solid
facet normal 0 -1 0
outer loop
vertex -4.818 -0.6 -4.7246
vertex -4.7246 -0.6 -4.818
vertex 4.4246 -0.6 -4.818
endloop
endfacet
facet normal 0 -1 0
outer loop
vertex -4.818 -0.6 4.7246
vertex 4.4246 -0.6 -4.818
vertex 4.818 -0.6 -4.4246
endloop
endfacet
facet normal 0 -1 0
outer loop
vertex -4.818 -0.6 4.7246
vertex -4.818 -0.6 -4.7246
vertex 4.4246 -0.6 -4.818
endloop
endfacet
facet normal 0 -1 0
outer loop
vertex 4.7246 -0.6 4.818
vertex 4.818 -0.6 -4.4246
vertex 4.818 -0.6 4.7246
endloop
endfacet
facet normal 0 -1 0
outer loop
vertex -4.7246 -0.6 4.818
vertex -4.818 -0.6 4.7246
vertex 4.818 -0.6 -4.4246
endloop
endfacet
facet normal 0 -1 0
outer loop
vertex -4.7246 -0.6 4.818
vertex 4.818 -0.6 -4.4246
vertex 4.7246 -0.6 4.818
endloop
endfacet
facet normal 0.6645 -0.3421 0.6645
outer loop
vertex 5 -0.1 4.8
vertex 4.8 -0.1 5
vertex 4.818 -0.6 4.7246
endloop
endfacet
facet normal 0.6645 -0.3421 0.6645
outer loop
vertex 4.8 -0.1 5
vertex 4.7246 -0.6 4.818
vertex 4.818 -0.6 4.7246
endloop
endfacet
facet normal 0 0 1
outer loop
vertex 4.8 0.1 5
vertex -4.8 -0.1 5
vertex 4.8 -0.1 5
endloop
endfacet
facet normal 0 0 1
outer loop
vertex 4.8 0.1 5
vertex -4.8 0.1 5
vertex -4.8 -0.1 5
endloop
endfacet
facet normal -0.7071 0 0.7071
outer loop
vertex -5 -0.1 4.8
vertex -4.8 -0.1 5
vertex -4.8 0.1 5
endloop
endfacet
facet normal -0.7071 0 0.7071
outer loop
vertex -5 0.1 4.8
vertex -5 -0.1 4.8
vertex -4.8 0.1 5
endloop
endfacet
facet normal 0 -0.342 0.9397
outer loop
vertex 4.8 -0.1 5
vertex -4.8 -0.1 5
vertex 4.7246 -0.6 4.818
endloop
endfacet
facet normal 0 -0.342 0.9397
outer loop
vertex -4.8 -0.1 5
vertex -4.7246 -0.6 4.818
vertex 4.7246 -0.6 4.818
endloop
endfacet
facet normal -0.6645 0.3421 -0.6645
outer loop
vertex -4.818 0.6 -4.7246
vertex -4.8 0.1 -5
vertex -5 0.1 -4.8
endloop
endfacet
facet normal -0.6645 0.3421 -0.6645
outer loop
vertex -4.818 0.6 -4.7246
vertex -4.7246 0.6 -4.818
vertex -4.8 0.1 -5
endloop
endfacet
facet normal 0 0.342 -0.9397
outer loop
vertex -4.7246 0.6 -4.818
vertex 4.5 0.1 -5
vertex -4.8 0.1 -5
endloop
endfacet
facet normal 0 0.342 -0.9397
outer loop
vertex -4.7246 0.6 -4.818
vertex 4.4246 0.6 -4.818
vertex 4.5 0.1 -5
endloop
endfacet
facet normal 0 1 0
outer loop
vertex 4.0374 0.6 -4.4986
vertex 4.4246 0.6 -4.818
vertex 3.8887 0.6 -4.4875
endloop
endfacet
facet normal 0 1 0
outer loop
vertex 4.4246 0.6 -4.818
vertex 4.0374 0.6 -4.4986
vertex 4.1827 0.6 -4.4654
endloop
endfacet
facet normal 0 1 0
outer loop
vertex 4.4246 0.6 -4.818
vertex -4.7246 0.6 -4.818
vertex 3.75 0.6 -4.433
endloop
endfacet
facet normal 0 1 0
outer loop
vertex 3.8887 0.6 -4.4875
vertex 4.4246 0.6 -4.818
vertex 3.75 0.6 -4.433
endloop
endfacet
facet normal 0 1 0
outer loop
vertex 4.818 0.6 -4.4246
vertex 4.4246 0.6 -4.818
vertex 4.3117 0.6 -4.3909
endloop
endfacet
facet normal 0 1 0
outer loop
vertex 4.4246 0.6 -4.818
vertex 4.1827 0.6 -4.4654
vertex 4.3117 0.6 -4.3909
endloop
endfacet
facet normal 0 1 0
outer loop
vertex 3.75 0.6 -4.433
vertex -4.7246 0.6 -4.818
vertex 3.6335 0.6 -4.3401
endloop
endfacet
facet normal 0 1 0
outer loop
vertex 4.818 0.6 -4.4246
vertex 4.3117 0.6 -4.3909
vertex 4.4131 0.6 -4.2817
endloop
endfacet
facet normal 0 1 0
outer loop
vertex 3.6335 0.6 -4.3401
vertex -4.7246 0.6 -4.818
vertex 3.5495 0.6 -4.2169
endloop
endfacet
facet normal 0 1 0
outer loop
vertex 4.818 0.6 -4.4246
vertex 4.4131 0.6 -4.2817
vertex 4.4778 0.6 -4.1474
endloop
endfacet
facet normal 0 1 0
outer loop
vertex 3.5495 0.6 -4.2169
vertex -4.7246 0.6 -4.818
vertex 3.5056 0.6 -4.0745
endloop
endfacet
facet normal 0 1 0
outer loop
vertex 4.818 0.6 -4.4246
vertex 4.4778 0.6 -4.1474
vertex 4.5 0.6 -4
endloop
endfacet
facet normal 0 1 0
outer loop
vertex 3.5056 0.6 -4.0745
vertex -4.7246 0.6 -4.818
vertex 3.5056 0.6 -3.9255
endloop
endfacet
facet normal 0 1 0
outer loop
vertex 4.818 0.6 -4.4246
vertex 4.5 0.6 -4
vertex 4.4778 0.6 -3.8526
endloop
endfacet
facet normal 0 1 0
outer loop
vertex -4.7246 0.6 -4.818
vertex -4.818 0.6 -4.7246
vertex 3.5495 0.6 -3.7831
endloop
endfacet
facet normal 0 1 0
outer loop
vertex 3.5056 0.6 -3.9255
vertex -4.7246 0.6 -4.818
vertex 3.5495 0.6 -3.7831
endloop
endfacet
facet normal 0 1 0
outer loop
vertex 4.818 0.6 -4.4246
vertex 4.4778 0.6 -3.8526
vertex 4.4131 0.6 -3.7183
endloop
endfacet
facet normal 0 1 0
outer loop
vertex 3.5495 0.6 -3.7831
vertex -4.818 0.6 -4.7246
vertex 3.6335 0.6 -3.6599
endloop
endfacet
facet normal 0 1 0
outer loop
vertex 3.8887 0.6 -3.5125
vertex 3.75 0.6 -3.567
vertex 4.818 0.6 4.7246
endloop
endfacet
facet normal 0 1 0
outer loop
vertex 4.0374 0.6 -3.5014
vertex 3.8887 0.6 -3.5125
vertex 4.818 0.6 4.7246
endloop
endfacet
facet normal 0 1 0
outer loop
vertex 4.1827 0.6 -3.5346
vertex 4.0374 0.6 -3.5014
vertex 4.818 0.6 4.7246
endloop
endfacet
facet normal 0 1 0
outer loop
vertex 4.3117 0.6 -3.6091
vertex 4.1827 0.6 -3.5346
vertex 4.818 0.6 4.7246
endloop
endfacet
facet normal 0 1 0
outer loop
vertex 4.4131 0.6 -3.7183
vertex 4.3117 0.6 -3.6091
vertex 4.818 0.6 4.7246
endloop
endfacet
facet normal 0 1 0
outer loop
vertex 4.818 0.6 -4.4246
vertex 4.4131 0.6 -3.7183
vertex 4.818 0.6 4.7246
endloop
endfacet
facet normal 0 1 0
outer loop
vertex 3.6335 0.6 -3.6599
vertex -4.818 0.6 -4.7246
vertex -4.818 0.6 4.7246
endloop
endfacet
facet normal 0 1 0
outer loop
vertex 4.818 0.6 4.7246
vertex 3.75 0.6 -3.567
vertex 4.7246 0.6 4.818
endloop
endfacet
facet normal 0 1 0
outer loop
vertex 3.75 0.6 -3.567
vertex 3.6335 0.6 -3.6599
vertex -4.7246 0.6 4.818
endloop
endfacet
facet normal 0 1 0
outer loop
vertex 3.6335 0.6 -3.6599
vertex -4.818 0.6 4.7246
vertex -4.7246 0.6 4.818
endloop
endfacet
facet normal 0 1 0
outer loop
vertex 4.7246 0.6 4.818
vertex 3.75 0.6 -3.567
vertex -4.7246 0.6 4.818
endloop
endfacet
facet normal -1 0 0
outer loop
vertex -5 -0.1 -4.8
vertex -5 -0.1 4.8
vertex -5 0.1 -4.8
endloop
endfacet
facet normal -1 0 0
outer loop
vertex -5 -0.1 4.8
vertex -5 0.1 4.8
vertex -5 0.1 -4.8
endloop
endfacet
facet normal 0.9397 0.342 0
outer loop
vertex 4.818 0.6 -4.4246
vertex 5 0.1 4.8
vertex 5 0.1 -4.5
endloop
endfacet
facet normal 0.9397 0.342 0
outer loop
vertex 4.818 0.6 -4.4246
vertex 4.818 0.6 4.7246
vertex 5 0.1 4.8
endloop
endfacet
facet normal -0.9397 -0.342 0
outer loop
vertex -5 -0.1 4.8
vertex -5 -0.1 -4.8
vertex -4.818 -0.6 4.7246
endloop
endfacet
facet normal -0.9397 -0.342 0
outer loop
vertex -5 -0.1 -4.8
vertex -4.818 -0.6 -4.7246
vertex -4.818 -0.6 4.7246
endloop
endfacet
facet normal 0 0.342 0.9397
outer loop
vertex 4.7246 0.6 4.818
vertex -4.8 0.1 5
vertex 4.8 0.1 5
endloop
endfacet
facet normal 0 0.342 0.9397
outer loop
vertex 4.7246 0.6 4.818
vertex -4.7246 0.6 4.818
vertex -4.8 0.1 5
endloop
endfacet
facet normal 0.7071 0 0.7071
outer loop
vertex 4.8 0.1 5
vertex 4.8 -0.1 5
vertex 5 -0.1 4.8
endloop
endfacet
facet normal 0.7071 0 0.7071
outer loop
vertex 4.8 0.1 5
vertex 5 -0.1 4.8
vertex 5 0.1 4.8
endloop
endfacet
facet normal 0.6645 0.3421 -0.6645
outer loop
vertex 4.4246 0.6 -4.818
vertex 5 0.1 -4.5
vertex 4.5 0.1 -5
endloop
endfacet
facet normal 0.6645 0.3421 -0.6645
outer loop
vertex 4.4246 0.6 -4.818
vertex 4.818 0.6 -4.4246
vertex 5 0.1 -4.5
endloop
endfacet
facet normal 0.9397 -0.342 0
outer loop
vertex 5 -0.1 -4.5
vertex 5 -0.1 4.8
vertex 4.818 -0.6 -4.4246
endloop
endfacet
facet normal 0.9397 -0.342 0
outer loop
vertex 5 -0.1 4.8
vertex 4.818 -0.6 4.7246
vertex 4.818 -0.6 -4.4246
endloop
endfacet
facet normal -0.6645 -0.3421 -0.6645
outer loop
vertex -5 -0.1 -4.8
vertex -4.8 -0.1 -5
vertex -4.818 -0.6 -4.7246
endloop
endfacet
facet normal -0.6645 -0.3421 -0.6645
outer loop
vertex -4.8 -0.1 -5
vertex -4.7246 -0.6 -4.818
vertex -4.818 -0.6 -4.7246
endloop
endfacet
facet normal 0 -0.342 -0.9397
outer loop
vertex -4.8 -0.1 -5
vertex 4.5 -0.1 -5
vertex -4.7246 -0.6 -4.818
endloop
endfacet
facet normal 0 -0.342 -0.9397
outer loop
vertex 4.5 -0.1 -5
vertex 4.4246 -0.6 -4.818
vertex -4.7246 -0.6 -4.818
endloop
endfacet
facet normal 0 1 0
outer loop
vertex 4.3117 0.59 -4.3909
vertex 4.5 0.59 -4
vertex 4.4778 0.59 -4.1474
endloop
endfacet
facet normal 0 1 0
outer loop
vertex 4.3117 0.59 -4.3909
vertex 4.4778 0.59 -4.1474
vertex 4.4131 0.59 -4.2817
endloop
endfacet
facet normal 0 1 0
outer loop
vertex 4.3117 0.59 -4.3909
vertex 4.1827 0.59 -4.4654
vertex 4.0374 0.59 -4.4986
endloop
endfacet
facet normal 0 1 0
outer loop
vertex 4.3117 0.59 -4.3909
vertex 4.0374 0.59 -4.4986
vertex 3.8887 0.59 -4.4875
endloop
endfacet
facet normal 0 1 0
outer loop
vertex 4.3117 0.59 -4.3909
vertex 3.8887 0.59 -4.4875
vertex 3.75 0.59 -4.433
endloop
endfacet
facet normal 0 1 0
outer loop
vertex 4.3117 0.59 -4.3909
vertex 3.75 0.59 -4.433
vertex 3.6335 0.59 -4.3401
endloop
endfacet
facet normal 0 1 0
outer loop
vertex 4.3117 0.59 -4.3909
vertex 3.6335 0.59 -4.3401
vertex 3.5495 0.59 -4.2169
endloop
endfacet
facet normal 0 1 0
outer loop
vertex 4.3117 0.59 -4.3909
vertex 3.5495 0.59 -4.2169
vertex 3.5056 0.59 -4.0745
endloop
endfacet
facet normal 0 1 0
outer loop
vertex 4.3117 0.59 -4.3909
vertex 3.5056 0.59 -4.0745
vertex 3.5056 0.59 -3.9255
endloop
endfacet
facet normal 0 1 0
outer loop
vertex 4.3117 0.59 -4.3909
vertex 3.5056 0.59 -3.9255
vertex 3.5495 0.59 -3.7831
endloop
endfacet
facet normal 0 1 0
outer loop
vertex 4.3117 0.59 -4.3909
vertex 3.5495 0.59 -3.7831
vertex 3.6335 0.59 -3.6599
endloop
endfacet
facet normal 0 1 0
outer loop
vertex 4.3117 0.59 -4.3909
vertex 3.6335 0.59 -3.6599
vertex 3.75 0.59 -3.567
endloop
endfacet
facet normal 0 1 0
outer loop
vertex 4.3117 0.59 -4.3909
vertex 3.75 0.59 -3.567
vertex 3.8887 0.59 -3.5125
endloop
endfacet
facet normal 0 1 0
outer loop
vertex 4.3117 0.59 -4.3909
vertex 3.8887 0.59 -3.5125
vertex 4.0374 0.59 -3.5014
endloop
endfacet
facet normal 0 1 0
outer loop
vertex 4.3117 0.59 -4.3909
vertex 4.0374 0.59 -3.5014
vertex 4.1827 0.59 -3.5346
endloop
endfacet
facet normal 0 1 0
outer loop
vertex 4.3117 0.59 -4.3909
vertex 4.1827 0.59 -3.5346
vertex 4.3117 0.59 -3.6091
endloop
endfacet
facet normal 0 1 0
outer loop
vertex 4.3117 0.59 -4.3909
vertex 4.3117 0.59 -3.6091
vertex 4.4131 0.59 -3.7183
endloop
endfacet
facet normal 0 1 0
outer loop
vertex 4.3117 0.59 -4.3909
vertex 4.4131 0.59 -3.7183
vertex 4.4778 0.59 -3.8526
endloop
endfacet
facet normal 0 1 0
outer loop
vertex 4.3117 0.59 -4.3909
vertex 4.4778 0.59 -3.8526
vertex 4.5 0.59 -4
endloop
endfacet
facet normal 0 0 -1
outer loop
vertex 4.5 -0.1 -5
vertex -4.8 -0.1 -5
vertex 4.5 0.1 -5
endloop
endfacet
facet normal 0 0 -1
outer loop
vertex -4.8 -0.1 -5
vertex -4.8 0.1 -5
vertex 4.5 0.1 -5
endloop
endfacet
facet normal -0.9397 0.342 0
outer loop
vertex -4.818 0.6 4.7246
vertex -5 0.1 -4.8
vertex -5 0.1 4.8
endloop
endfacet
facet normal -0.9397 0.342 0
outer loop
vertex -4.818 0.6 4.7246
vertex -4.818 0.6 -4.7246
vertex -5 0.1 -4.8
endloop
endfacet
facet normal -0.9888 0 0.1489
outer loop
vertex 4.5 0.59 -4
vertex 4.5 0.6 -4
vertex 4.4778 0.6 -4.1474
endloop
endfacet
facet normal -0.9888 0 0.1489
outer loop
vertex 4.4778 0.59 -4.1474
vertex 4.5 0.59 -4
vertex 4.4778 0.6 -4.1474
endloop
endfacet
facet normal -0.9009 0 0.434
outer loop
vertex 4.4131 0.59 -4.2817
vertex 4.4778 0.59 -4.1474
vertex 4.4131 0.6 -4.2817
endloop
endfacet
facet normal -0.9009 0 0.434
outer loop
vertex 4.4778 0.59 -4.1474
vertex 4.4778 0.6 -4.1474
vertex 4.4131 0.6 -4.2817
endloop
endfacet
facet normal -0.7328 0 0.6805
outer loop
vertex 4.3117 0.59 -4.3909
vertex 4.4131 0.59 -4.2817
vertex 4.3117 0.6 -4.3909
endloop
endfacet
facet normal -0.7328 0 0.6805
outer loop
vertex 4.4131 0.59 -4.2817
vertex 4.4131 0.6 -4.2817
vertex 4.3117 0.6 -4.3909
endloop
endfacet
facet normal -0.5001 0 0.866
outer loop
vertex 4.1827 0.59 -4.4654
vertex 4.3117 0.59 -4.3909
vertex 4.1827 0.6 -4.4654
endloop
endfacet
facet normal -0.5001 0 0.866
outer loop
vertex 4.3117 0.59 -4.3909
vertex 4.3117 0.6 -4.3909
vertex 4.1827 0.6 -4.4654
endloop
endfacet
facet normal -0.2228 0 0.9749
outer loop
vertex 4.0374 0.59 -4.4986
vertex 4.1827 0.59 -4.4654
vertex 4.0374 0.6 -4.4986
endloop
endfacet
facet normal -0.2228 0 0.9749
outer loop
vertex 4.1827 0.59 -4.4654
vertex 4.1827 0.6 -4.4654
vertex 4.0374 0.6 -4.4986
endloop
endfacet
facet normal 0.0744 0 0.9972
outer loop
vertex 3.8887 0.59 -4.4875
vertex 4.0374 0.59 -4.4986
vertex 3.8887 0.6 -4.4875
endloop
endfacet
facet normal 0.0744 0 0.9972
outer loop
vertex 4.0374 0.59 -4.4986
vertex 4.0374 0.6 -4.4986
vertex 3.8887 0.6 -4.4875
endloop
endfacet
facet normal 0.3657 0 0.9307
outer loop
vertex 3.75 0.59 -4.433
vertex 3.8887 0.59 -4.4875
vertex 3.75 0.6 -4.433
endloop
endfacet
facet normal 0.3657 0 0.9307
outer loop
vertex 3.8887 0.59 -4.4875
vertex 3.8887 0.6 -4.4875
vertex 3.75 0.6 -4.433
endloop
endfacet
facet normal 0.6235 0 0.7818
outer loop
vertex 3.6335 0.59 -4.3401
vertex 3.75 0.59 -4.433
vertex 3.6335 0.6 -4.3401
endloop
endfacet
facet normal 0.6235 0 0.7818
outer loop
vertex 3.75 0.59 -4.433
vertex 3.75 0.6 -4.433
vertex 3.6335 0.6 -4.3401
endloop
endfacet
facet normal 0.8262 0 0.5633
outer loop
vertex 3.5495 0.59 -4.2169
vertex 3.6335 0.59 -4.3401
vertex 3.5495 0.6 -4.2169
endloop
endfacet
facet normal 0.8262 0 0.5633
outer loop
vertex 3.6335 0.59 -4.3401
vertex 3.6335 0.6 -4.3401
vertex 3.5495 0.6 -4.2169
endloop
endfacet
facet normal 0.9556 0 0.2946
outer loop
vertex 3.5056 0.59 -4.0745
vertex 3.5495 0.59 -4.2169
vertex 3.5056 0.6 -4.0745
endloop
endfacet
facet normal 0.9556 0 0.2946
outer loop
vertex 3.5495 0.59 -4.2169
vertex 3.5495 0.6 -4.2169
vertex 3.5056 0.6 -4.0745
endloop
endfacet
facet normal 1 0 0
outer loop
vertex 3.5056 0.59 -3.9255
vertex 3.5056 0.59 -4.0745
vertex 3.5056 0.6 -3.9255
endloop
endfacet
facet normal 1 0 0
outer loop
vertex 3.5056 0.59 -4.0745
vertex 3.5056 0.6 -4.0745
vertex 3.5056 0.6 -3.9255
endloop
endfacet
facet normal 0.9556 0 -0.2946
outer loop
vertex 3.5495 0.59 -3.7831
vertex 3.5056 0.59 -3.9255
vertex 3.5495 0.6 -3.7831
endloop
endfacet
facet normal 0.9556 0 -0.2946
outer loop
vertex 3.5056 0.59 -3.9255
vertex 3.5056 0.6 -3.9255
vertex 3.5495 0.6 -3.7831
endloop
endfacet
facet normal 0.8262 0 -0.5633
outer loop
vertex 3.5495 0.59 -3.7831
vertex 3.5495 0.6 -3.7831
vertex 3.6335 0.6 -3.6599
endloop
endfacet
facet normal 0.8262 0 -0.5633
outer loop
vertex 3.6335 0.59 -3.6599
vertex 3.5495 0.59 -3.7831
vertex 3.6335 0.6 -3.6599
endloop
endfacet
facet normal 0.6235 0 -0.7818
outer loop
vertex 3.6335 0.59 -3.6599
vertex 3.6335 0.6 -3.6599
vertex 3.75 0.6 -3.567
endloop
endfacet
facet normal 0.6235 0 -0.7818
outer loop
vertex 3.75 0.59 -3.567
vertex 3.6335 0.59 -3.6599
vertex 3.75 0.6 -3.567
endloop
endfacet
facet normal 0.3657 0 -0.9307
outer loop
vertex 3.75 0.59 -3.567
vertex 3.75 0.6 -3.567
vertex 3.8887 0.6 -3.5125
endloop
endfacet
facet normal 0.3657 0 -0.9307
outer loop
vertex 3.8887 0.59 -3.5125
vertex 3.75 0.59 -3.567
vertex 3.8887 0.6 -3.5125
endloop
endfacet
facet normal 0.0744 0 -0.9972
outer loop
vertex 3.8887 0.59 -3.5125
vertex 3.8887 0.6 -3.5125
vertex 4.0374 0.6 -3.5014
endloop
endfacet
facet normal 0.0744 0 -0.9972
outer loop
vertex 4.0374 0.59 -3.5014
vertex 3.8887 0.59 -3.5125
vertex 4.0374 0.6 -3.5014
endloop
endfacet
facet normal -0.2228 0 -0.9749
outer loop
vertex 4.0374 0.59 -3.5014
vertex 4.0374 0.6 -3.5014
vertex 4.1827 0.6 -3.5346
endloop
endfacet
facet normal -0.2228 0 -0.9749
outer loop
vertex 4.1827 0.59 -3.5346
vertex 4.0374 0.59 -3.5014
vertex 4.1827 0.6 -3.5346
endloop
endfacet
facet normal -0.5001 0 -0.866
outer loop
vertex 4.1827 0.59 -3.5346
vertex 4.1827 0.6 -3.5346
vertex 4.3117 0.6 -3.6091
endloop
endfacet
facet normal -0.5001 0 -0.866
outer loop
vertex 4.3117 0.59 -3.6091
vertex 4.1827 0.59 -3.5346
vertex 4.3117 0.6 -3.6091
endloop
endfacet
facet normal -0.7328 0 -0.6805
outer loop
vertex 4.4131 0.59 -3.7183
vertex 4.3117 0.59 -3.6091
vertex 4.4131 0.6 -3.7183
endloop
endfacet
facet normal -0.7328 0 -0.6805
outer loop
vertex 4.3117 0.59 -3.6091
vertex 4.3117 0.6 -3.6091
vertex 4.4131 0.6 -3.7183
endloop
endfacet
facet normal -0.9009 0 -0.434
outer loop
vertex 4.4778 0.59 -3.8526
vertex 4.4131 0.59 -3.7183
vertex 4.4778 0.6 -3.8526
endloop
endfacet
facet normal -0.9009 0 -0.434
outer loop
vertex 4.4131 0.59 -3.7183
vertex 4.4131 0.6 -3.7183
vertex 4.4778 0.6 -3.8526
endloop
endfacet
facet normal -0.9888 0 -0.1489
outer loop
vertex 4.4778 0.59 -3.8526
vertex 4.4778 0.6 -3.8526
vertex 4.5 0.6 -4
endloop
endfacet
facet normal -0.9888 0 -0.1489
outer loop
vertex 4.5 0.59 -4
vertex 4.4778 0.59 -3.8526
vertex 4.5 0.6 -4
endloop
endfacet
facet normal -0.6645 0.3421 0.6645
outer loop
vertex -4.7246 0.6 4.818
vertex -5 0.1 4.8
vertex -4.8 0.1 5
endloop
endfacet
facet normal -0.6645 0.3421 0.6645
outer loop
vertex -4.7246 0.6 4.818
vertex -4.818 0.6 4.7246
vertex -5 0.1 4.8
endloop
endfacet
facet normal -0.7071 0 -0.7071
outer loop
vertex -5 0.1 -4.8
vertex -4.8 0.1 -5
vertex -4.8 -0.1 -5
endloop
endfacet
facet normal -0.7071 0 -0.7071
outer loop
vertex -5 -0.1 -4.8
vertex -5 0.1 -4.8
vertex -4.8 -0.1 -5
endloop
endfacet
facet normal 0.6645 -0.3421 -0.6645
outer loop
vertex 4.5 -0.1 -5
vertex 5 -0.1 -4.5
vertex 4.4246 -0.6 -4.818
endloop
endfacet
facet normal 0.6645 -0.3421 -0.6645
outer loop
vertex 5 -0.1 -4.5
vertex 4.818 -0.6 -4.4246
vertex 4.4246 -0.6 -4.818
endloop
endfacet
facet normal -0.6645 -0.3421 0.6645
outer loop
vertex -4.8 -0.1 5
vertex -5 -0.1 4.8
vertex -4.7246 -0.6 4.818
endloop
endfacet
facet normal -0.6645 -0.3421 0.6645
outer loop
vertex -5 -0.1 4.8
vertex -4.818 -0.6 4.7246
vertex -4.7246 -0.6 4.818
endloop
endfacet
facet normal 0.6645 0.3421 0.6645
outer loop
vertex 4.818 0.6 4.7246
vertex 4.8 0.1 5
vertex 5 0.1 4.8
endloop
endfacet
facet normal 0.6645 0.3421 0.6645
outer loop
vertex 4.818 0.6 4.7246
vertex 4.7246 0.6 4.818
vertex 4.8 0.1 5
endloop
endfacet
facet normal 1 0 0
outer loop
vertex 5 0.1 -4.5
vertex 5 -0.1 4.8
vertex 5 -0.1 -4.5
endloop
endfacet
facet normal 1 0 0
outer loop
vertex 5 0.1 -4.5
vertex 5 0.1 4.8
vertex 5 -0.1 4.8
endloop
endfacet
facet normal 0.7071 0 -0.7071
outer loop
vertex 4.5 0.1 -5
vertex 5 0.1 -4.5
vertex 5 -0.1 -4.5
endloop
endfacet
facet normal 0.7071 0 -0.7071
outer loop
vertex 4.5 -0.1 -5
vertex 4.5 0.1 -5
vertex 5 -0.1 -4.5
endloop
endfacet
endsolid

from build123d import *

# Parameters (mm, degrees)
SKETCH1_W           = 10
SKETCH1_H           = 10
BOSS_EXTRUDE1_DEPTH = 0.1
CHAMFER1_SIZE       = 0.2
CHAMFER2_SIZE       = 0.5
BOSS_EXTRUDE2_DEPTH = 0.5
BOSS_EXTRUDE2_TAPER = 20
SKETCH3_R           = 0.5
CUT_EXTRUDE1_DEPTH  = 0.01


with BuildPart() as part:
    # Sketch1 → Boss-Extrude1 (new body, symmetric)
    with BuildSketch(Plane(origin=(0, 0, 0), x_dir=(1, 0, 0), z_dir=(0, 1, 0))):
        Rectangle(SKETCH1_W, SKETCH1_H)
    extrude(amount=BOSS_EXTRUDE1_DEPTH, both=True)

    # Chamfer1
    chamfer1_edges = [part.edges().sort_by_distance(p)[0] for p in [
        (5, 0, 5),
        (-5, 0, 5),
        (-5, 0, -5),
    ]]
    chamfer(chamfer1_edges, length=CHAMFER1_SIZE)

    # Chamfer2
    chamfer2_edges = [part.edges().sort_by_distance(p)[0] for p in [
        (5, 0, -5),
    ]]
    chamfer(chamfer2_edges, length=CHAMFER2_SIZE)

    # Sketch2 → Boss-Extrude2 (add)
    with BuildSketch(Plane(origin=(0, 0.1, 0), x_dir=(1, 0, 0), z_dir=(0, 1, 0))):
        Polygon((-4.8, 5), (-5, 4.8), (-5, -4.8), (-4.8, -5), (4.8, -5), (5, -4.8), (5, 4.5), (4.5, 5), align=None)
    boss_extrude2 = extrude(amount=BOSS_EXTRUDE2_DEPTH, taper=BOSS_EXTRUDE2_TAPER)

    # Mirror1: Boss-Extrude2 across plane
    add(boss_extrude2.mirror(Plane.ZX))

    # Sketch3 → Cut-Extrude1 (cut)
    with BuildSketch(Plane(origin=(0, 0.6, 0), x_dir=(1, 0, 0), z_dir=(0, 1, 0))):
        with Locations((4, 4)):
            Circle(SKETCH3_R)
    extrude(amount=-CUT_EXTRUDE1_DEPTH, mode=Mode.SUBTRACT)


solid = part.part
